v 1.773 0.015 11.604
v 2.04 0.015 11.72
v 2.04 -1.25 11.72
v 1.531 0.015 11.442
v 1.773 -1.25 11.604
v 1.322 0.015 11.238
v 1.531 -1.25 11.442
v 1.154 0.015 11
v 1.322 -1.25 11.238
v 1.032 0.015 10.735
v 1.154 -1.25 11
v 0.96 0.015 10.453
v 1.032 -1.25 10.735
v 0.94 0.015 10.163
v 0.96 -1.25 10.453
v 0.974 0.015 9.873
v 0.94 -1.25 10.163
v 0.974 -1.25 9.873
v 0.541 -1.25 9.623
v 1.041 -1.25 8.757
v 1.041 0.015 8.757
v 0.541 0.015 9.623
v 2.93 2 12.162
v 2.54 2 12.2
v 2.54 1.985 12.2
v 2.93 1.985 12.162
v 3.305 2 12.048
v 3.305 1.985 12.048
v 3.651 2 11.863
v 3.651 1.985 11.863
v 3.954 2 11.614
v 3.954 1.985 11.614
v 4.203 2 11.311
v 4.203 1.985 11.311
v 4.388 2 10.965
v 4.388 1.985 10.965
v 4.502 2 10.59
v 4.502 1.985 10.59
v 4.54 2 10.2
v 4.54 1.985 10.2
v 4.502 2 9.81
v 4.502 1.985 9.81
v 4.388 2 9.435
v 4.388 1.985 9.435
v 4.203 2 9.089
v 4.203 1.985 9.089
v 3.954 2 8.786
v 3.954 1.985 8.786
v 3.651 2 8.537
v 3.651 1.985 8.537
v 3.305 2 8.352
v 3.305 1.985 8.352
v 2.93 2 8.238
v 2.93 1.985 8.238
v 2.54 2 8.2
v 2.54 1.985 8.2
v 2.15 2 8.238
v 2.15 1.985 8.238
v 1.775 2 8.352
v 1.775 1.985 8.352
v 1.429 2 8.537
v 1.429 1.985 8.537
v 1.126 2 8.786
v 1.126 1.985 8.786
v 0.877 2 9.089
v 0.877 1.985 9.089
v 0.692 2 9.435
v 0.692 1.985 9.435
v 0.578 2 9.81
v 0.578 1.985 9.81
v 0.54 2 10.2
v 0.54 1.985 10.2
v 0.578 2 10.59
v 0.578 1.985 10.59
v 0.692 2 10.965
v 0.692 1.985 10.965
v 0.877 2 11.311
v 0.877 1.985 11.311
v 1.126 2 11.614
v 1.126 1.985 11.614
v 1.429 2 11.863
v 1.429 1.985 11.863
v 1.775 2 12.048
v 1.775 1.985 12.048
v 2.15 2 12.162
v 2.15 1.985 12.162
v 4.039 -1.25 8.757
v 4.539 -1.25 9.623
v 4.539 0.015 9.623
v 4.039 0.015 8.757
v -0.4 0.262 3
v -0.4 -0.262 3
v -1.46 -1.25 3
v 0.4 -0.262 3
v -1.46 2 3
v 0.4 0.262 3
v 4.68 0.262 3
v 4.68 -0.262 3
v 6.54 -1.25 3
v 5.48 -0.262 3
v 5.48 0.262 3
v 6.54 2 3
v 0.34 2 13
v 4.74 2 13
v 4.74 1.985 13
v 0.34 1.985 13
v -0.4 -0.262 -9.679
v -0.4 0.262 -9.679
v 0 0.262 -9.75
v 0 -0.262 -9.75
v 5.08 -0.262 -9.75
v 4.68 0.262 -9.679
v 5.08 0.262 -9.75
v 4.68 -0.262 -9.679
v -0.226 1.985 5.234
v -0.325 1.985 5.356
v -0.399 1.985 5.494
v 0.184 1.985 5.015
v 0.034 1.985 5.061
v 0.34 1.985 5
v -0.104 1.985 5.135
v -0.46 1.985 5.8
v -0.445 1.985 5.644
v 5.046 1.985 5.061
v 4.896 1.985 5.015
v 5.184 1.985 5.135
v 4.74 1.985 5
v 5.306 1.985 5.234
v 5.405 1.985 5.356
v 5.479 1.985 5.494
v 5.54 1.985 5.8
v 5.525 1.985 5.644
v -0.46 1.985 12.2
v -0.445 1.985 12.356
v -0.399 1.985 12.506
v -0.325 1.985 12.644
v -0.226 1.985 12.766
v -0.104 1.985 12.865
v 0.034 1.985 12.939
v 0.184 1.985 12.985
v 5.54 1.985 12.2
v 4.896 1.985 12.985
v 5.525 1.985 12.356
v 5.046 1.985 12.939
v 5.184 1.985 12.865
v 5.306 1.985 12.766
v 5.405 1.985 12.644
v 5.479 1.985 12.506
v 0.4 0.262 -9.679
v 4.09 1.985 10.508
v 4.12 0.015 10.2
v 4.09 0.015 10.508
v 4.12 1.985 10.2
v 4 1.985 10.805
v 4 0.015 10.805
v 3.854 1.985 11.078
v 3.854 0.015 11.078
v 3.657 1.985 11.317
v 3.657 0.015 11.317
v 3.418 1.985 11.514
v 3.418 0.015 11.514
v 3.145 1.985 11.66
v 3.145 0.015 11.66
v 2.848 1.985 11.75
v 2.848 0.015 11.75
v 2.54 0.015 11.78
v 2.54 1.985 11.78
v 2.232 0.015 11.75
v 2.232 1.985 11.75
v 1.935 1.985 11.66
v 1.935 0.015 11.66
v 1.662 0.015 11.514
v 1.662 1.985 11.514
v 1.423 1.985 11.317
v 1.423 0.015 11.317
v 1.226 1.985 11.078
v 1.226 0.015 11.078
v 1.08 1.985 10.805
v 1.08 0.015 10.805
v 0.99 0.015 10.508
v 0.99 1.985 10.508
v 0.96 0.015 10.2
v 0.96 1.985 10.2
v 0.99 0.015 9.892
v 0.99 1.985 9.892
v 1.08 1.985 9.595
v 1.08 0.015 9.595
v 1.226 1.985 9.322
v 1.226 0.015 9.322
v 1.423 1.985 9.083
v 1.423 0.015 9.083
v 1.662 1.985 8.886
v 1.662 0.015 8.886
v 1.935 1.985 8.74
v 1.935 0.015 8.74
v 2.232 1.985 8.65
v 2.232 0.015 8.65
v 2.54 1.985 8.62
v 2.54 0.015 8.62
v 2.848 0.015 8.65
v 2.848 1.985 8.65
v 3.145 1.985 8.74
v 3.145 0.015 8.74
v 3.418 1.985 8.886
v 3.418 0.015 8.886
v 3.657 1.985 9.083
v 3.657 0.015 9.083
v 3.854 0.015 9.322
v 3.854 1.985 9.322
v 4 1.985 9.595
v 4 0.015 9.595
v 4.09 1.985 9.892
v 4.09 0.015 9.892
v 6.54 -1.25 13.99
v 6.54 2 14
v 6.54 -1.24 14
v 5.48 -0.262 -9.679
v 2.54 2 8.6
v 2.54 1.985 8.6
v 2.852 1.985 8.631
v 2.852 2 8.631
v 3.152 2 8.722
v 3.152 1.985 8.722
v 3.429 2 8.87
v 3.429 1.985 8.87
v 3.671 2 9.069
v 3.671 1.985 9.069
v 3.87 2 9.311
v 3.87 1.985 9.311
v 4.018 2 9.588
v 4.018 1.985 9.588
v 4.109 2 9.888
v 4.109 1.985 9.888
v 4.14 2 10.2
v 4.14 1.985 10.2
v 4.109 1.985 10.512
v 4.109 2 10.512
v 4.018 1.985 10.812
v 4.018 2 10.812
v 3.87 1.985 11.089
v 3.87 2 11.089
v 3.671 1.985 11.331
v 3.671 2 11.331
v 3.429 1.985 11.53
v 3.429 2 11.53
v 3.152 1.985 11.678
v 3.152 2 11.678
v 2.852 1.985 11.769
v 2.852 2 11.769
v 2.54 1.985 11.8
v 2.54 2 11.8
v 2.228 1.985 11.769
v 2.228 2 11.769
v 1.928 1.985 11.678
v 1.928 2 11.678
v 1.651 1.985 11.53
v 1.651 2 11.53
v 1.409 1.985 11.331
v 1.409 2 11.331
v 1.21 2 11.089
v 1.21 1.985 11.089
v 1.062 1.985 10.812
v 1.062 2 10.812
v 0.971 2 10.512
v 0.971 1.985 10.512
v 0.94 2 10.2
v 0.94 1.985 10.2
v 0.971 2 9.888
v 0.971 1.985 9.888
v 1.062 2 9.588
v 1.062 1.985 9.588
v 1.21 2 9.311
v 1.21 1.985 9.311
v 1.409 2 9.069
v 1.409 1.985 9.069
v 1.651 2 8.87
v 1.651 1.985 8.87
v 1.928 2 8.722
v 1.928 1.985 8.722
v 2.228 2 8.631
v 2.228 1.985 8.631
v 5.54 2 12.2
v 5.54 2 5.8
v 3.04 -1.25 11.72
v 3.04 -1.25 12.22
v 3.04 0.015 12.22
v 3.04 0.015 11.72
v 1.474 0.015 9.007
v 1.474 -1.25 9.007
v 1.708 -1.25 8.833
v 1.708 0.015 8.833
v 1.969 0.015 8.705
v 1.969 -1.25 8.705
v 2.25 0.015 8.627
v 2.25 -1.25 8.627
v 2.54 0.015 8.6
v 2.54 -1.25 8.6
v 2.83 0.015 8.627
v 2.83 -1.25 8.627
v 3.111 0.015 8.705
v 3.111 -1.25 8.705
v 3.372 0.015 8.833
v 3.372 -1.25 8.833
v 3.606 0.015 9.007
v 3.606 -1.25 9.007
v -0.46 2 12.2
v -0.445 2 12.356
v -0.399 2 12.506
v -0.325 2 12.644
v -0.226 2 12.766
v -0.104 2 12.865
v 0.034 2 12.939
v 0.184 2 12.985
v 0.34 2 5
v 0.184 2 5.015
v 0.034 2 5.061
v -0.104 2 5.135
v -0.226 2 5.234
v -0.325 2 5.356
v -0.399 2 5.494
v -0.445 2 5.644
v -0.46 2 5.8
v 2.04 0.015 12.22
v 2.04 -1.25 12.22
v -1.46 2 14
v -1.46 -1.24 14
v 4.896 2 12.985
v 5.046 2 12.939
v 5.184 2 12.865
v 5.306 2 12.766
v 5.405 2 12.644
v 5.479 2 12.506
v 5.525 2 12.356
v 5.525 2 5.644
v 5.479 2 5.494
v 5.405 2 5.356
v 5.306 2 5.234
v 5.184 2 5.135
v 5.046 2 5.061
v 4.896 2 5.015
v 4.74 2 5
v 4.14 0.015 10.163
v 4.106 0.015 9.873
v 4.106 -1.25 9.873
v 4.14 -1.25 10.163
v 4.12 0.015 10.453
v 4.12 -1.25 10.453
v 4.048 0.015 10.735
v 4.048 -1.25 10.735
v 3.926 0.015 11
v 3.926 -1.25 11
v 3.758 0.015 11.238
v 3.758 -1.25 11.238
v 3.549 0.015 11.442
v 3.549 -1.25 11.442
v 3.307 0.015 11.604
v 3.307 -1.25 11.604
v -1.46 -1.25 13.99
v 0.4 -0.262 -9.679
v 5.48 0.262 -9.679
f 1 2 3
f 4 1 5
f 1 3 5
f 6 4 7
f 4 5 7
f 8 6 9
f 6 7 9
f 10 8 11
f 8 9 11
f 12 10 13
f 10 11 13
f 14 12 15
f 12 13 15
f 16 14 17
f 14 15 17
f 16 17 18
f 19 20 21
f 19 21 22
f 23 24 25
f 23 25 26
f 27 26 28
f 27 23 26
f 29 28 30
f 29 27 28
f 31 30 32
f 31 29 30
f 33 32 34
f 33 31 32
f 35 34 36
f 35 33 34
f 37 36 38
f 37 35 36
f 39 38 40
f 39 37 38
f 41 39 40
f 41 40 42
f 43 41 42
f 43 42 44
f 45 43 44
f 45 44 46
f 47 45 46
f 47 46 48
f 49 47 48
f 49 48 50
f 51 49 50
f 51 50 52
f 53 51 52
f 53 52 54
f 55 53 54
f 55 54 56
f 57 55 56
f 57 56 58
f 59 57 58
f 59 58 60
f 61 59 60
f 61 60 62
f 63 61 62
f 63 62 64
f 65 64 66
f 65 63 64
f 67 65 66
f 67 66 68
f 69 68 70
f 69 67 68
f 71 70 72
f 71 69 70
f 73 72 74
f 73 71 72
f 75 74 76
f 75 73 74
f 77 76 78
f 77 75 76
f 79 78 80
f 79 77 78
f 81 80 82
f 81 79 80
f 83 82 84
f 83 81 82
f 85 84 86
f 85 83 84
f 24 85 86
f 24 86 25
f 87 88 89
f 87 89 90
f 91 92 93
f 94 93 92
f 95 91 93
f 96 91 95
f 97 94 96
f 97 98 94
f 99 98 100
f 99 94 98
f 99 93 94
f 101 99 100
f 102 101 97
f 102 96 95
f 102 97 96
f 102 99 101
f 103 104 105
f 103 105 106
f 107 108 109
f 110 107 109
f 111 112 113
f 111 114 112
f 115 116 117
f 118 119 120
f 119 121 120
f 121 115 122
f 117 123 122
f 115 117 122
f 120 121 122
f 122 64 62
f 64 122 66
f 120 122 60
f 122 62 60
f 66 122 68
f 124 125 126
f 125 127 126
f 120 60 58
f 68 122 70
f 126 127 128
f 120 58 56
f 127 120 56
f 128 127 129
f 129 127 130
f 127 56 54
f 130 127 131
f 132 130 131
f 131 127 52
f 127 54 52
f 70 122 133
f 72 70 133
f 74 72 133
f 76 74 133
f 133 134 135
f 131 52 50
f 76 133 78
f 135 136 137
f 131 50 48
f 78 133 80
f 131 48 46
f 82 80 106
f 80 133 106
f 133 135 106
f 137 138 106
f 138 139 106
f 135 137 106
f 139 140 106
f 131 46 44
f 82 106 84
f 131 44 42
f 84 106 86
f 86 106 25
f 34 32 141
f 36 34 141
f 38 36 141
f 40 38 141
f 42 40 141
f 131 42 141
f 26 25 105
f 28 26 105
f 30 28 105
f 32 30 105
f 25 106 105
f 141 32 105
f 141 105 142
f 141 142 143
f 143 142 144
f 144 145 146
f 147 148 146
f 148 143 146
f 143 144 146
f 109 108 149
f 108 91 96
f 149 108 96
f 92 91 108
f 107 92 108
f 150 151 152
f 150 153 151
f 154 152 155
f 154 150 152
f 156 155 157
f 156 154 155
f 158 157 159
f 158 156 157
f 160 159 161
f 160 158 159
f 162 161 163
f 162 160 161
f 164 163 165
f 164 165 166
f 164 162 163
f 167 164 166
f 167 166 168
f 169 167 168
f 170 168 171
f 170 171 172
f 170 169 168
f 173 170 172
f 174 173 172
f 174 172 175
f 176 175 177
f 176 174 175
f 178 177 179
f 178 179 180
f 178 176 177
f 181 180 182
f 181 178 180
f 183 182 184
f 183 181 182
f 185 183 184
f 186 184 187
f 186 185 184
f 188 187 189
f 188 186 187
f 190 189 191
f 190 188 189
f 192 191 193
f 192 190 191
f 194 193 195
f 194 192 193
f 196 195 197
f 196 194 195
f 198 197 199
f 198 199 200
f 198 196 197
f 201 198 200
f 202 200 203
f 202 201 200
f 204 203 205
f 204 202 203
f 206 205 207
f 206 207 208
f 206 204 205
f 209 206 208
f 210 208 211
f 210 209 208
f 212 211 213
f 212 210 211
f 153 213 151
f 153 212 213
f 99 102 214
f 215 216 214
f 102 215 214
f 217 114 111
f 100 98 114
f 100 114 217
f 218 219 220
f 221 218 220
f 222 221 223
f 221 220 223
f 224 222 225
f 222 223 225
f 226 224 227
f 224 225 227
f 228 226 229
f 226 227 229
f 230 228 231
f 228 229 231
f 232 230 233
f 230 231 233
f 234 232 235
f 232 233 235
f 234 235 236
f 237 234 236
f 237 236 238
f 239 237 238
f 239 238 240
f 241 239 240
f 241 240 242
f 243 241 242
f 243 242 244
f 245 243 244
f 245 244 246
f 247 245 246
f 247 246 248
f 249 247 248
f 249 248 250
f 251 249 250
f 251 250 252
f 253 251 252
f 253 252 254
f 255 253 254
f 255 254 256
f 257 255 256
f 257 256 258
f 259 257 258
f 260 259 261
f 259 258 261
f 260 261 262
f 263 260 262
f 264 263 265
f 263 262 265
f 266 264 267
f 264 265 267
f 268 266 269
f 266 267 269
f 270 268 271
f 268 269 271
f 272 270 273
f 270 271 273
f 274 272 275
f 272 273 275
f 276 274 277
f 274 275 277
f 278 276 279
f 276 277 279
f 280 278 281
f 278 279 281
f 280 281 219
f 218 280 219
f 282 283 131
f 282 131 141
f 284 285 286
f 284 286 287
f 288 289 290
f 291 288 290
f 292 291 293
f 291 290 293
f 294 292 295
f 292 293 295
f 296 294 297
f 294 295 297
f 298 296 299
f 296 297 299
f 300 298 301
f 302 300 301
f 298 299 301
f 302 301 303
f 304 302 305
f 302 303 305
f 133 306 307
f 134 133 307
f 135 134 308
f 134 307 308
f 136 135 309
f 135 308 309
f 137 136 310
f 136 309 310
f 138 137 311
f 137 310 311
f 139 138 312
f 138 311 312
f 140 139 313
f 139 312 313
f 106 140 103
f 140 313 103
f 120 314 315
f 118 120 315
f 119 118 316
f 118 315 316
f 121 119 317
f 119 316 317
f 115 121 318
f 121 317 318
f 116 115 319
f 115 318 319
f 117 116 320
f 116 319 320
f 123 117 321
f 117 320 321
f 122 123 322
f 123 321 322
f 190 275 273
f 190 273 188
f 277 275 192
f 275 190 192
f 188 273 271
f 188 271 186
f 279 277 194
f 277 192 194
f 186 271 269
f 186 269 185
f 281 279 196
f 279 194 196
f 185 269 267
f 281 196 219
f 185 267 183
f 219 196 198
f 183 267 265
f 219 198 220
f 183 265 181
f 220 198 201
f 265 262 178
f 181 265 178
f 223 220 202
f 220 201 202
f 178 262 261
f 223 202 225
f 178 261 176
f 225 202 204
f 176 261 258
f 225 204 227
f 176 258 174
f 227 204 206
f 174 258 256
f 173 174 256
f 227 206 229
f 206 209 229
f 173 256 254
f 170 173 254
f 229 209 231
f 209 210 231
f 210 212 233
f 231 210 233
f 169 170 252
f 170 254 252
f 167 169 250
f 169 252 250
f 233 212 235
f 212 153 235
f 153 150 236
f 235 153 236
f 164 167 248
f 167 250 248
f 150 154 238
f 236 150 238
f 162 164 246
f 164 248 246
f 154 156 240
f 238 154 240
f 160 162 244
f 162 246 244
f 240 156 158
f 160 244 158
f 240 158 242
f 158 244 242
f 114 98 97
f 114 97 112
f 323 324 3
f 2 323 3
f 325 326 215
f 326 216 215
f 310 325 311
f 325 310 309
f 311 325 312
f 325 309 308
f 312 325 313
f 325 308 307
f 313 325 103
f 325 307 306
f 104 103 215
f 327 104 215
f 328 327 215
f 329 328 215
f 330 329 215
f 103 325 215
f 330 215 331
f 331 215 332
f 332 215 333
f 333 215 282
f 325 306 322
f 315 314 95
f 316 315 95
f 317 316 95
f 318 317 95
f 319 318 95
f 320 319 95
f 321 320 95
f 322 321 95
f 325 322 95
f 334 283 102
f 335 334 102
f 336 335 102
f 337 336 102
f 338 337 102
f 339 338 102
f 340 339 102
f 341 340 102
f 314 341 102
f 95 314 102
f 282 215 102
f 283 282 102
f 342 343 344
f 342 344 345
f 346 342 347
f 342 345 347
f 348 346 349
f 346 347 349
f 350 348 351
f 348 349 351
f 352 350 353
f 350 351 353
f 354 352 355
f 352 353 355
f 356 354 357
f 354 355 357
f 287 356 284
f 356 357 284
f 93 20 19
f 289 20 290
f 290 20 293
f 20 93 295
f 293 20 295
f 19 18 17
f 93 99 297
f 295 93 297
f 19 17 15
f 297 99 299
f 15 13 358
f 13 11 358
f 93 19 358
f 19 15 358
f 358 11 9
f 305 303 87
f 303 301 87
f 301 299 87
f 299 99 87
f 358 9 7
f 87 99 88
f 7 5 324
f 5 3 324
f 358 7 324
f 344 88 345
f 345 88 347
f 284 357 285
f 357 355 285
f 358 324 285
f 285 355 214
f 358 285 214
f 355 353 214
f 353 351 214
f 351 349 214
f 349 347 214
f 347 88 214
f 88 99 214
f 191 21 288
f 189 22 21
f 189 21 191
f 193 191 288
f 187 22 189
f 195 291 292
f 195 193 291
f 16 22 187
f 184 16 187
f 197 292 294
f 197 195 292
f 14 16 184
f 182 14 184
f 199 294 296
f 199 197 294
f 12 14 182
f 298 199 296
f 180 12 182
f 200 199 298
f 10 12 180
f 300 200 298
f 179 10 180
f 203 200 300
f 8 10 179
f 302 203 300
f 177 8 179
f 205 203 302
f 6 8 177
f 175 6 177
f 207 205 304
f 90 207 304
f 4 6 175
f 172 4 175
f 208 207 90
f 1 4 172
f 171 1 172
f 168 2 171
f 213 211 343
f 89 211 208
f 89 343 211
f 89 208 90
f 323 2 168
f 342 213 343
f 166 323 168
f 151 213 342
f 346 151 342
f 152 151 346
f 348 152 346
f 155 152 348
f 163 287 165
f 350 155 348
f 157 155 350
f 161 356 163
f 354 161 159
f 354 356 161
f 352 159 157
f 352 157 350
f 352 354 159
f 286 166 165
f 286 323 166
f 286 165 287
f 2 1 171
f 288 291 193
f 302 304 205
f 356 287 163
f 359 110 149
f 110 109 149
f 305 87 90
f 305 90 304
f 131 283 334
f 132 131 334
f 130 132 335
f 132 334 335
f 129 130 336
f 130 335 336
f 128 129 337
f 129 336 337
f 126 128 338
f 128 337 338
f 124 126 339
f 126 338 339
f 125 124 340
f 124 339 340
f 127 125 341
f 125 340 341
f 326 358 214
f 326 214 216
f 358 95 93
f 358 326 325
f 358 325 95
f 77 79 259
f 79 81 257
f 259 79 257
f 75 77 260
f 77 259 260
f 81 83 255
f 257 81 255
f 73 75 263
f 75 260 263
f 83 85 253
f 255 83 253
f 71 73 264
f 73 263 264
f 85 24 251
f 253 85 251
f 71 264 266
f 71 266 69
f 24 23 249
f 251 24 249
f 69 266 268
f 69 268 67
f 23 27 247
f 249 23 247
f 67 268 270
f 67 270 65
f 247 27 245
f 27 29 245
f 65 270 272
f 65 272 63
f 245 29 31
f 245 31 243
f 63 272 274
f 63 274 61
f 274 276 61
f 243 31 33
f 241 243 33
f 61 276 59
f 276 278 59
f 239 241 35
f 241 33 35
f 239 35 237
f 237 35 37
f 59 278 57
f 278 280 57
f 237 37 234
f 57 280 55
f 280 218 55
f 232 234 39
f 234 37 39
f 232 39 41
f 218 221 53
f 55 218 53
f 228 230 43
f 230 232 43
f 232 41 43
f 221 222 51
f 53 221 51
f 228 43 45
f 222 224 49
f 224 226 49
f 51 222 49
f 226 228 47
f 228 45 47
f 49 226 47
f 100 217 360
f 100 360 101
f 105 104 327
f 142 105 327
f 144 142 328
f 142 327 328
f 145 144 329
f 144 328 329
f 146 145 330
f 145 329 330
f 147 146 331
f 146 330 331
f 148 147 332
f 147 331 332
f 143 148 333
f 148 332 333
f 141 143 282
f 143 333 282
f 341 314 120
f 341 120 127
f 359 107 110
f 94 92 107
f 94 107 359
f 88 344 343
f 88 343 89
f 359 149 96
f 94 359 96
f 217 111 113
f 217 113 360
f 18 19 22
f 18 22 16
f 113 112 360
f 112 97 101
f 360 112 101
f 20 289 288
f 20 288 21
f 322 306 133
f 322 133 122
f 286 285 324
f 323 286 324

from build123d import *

# Parameters (mm, degrees)
SKETCH005_W     = 7.4
SKETCH005_H     = 10.4
SKETCH005_R     = 1.58
PAD003_DEPTH    = 0.985
PAD001_DEPTH    = 4
POCKET_DEPTH    = 1.35
SKETCH004_R     = 1.6
POCKET001_DEPTH = 3.251
SKETCH006_R     = 2
POCKET002_DEPTH = 0.02
PAD_DEPTH       = 0.2625


with BuildPart() as pad003:
    # Sketch005 → Pad003 (new body, symmetric)
    with BuildSketch(Plane.XZ.offset(-1)):
        with Locations((2.54, 8.4)):
            Rectangle(SKETCH005_W, SKETCH005_H)
        with Locations((2.54, 10.2)):
            Circle(SKETCH005_R, mode=Mode.SUBTRACT)
    extrude(amount=PAD003_DEPTH, both=True)


with BuildPart() as pocket002:
    # Sketch001 → Pad001 (new body, symmetric)
    with BuildSketch(Plane.YZ.offset(2.54)):
        Polygon((0, 3), (-1.25, 3), (-1.25, 13.99), (-1.24, 14), (2, 14), (2, 3), align=None)
    extrude(amount=PAD001_DEPTH, both=True)

    # Sketch003 → Pocket (cut)
    with BuildSketch(Plane(origin=(2.54, -1.25, 0), x_dir=(0, 0, -1), z_dir=(0, -1, 0))):
        with BuildLine():
            Line((-12.219868, 0.5), (-12.219868, -0.5))
            Line((-12.219868, -0.5), (-11.719868, -0.5))
            ThreePointArc((-11.719868, -0.5), (-11, -1.385641), (-9.873078, -1.566245))
            Line((-9.623078, -1.999257), (-9.873078, -1.566245))
            Line((-8.757053, -1.499257), (-9.623078, -1.999257))
            Line((-9.007053, -1.066245), (-8.757053, -1.499257))
            ThreePointArc((-9.007053, -1.066245), (-8.6, 0), (-9.007053, 1.066245))
            Line((-8.757053, 1.499257), (-9.007053, 1.066245))
            Line((-9.623078, 1.999257), (-8.757053, 1.499257))
            Line((-9.873078, 1.566245), (-9.623078, 1.999257))
            ThreePointArc((-9.873078, 1.566245), (-11, 1.385641), (-11.719868, 0.5))
            Line((-12.219868, 0.5), (-11.719868, 0.5))
        make_face()
    extrude(amount=-POCKET_DEPTH, mode=Mode.SUBTRACT)

    # Sketch004 → Pocket001 (cut, through all)
    with BuildSketch(Plane(origin=(2.54, -1.25, 0), x_dir=(0, 0, -1), z_dir=(0, -1, 0))):
        with Locations((-10.2, 0)):
            Circle(SKETCH004_R)
    extrude(amount=-POCKET001_DEPTH, mode=Mode.SUBTRACT)

    # Sketch006 → Pocket002 (cut)
    with BuildSketch(Plane(origin=(2.54, 2, 0), x_dir=(0, 0, 1), z_dir=(0, 1, 0))):
        with BuildLine():
            Line((5.8, 3), (12.2, 3))
            ThreePointArc((13, 2.2), (12.765685, 2.765685), (12.2, 3))
            Line((13, 2.2), (13, -2.2))
            ThreePointArc((12.2, -3), (12.765685, -2.765685), (13, -2.2))
            Line((12.2, -3), (5.8, -3))
            ThreePointArc((5, -2.2), (5.234315, -2.765685), (5.8, -3))
            Line((5, -2.2), (5, 2.2))
            ThreePointArc((5.8, 3), (5.234315, 2.765685), (5, 2.2))
        make_face()
        with Locations((10.2, 0)):
            Circle(SKETCH006_R, mode=Mode.SUBTRACT)
    extrude(amount=-POCKET002_DEPTH, mode=Mode.SUBTRACT)


with BuildPart() as to_126_2_vertical:
    # Sketch → Pad (new body, symmetric)
    with BuildSketch(Plane.XZ):
        Polygon((-0.4, 0.3025), (-0.4, 0), (-0.4, -9.679469), (0, -9.75), (0.4, -9.679469), (0.4, 0), (0.4, 0.3025), (0.4, 3.73), (-0.4, 3.73), align=None)
        Polygon((4.68, 0.3025), (4.68, 0), (4.68, -9.679469), (5.08, -9.75), (5.48, -9.679469), (5.48, 0), (5.48, 0.3025), (5.48, 3.73), (4.68, 3.73), align=None)
    extrude(amount=PAD_DEPTH, both=True)

    # Pad_mp_cp: union Pad003, Pocket002
    add(pad003.part)
    add(pocket002.part)


solid = to_126_2_vertical.part
